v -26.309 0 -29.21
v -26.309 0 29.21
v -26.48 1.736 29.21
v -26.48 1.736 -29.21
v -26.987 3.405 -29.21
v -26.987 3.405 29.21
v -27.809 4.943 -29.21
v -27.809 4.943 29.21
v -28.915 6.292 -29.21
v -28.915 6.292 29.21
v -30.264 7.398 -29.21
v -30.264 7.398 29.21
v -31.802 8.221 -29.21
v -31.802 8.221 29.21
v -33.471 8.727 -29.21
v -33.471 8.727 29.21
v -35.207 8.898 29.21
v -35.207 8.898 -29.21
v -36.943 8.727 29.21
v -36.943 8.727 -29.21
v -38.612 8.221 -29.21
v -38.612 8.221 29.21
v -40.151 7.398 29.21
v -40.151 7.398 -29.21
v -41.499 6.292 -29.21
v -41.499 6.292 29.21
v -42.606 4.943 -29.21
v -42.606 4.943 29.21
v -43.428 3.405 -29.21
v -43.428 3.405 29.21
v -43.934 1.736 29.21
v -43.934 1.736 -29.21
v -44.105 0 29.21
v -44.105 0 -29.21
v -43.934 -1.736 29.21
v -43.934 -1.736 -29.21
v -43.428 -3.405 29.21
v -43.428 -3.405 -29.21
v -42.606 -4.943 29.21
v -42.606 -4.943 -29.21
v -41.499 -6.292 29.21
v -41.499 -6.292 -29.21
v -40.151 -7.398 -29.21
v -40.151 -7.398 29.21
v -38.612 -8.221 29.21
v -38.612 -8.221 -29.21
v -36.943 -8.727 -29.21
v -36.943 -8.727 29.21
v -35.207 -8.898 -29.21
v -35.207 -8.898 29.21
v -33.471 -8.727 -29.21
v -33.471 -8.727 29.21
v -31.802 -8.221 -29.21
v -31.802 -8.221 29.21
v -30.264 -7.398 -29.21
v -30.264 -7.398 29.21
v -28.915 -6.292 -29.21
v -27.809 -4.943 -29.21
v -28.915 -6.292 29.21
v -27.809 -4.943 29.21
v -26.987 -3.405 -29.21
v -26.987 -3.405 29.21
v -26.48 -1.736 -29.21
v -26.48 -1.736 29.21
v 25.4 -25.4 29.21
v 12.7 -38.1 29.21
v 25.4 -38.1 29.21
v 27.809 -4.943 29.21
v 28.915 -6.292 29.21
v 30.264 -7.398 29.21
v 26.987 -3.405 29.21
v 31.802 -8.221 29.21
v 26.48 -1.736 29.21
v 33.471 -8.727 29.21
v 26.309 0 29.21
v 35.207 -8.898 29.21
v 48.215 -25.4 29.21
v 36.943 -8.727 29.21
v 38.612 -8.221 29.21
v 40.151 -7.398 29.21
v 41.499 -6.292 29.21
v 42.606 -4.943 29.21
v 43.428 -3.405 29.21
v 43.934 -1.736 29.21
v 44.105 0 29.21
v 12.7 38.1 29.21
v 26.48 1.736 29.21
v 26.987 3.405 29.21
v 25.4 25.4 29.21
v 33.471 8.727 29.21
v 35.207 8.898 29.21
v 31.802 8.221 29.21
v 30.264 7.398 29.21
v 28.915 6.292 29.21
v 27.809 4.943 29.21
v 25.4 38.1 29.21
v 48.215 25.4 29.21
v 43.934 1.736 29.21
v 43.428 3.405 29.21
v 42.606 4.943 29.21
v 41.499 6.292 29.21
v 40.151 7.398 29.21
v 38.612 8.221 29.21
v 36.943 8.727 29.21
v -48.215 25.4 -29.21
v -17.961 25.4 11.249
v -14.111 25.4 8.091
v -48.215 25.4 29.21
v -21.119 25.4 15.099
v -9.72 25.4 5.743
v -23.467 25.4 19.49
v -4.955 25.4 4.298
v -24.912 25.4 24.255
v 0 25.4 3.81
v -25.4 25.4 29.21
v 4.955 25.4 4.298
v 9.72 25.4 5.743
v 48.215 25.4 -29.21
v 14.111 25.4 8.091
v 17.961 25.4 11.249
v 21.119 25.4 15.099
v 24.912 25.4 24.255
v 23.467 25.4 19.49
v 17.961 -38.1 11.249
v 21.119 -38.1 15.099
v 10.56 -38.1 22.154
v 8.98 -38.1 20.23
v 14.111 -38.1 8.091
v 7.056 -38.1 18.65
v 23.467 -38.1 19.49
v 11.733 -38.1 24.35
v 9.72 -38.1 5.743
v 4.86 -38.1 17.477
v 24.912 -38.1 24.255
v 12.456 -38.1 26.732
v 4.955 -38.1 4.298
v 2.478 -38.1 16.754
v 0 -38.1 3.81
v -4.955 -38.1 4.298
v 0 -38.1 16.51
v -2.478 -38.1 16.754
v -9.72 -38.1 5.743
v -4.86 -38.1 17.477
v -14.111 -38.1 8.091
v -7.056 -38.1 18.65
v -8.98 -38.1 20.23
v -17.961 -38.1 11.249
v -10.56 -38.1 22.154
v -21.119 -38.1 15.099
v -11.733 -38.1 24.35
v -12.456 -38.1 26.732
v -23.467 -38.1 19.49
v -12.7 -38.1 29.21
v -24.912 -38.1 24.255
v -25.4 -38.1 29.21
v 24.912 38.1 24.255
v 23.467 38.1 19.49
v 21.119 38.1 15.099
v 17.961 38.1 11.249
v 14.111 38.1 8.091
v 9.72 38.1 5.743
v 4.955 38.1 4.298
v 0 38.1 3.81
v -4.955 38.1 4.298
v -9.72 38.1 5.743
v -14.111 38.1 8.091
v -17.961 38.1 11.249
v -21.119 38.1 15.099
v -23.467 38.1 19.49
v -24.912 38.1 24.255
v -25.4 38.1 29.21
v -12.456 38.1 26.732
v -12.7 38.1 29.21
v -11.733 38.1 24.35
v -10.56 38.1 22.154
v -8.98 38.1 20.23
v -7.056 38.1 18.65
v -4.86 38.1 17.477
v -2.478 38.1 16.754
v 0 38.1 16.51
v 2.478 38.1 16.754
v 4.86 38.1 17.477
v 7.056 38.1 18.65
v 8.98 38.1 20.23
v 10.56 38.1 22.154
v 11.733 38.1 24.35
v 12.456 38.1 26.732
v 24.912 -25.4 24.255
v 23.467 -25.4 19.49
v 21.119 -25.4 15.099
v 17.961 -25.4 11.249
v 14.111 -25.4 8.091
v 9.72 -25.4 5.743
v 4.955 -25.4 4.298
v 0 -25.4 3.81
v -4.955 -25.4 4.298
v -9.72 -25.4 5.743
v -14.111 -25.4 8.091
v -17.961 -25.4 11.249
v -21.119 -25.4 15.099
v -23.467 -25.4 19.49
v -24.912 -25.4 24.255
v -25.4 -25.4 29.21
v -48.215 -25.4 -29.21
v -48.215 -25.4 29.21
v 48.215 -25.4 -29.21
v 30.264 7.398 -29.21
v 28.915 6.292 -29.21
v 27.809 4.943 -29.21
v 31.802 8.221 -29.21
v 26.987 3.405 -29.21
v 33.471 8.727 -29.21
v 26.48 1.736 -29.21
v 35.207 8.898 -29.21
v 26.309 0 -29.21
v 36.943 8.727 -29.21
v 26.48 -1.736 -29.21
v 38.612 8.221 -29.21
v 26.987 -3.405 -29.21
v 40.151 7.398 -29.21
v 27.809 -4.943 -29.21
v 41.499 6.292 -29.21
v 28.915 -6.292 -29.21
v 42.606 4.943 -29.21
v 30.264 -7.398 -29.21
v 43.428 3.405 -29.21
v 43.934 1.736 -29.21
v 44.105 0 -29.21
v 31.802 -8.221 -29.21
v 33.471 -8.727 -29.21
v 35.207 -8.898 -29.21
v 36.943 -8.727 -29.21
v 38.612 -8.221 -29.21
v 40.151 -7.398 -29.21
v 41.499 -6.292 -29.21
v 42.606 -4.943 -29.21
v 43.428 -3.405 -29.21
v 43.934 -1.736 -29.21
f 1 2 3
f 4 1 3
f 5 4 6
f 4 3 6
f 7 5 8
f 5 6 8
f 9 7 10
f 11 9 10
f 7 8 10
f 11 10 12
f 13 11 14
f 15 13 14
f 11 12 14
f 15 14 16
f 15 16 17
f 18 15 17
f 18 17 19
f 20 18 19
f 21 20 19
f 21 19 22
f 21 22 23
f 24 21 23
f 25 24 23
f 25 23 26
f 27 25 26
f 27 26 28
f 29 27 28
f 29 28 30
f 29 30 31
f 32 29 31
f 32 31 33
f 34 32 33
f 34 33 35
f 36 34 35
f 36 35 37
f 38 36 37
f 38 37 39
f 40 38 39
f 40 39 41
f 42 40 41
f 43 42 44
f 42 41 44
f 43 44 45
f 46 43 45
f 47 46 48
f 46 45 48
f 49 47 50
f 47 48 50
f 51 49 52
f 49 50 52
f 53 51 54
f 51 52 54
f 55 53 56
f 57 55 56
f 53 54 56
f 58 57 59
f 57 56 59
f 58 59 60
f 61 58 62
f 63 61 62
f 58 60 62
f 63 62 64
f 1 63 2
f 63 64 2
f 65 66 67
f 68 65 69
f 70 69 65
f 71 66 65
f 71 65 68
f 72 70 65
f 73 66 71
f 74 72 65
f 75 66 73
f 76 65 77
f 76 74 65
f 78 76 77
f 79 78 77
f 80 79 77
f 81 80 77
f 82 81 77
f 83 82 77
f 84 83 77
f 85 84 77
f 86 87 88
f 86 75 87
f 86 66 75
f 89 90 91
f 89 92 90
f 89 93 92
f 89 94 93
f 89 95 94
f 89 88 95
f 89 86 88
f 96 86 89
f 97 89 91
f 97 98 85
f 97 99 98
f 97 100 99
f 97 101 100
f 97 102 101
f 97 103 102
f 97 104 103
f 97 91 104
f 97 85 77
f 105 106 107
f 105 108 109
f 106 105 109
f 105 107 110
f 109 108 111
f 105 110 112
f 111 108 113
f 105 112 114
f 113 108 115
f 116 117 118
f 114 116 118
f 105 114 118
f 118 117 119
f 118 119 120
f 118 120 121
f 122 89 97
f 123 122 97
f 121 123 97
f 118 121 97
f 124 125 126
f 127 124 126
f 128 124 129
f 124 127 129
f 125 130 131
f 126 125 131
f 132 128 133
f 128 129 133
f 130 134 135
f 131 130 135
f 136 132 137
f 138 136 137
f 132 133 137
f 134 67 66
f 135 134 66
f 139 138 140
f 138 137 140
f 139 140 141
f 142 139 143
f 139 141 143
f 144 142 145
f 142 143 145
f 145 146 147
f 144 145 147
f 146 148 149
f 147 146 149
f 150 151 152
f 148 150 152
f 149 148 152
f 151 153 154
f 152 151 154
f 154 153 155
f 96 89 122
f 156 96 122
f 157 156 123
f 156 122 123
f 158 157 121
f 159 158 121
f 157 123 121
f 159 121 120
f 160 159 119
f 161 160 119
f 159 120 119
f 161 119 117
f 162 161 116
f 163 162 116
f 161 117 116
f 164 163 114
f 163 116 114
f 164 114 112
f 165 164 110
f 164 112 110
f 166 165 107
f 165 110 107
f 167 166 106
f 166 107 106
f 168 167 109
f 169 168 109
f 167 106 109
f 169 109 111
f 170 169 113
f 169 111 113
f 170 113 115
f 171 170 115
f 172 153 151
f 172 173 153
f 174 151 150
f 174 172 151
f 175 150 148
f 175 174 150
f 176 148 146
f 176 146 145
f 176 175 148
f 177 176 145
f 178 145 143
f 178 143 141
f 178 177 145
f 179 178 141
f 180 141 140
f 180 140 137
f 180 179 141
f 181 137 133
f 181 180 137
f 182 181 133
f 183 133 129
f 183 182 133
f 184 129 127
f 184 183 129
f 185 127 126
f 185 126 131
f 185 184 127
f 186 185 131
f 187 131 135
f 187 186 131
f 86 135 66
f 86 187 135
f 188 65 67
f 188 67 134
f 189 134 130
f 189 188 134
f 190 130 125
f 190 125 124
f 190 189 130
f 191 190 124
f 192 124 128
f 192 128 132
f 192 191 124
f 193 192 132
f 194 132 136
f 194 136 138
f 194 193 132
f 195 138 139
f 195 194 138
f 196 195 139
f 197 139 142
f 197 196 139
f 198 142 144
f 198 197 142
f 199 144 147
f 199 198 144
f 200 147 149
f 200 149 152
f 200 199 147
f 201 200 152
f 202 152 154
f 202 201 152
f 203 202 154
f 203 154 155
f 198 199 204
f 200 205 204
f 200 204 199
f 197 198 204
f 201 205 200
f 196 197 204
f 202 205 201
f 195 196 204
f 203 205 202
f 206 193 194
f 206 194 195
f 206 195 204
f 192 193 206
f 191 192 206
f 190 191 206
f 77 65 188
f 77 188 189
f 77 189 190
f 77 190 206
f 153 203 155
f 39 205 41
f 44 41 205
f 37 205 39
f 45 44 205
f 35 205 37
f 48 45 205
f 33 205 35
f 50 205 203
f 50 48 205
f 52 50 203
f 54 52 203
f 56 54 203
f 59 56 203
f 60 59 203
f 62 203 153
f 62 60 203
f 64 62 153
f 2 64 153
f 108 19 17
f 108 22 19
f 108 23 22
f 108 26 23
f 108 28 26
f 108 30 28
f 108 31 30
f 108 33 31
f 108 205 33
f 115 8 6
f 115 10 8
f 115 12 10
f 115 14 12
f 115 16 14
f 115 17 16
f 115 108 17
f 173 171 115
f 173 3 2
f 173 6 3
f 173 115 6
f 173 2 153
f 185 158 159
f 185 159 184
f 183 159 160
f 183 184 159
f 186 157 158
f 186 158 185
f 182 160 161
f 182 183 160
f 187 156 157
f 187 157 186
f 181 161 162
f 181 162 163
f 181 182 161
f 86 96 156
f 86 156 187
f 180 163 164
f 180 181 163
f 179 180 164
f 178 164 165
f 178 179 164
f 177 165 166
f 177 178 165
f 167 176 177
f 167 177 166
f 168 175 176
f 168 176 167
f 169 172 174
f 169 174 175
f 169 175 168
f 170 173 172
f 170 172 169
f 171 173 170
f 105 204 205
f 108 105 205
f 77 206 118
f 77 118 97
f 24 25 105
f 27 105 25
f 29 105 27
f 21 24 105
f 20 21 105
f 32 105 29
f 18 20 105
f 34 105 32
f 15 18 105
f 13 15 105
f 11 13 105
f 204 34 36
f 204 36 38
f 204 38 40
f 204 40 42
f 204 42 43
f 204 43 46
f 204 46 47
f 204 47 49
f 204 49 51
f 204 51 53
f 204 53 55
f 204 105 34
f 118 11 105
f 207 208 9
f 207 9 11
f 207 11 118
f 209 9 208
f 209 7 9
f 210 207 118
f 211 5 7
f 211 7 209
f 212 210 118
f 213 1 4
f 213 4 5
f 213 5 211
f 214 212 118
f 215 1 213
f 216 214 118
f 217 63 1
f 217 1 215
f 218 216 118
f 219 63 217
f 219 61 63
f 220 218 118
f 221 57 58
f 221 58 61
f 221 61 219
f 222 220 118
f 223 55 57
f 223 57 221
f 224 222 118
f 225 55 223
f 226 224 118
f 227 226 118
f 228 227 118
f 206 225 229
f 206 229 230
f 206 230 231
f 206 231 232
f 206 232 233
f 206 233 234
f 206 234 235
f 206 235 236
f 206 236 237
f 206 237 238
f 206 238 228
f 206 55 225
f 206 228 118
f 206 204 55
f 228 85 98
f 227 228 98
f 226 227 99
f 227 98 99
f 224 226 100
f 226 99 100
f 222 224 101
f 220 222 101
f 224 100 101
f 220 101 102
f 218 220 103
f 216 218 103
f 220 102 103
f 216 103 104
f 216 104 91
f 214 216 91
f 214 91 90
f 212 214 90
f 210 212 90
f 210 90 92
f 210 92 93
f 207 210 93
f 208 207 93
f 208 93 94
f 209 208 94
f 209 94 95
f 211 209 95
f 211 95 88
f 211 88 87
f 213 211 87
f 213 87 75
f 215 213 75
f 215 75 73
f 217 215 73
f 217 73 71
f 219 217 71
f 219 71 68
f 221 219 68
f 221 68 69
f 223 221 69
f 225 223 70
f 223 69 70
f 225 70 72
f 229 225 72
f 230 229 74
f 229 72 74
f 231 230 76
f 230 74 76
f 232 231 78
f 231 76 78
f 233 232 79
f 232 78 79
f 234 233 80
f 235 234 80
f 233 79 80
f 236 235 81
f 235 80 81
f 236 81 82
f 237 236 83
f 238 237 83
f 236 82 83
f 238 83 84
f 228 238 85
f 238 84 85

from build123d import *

# Parameters (mm, degrees)
F0_W     = 96.4296718666
F0_H     = 58.42
F1_DEPTH = 25.4
F4_DEPTH = 254
F6_DEPTH = 12.7
F2_R     = 8.8980244031
F7_DEPTH = 254


# Not quite as in the source:
# - a pattern or mirror of a feature is missing from the dataset's text; its kind, count and spacing are read off the source's solid


with BuildPart() as f1:
    # F0 (on Front) → F1 (new body, symmetric)
    with BuildSketch(Plane.XZ):
        Rectangle(F0_W, F0_H)
    extrude(amount=F1_DEPTH, both=True)

    # F3 (on face) → F4 (cut)
    with BuildSketch(Plane.XZ.offset(25.4)):
        with BuildLine():
            Line((12.7, 29.21), (-12.7, 29.21))
            ThreePointArc((-12.7, 29.21), (0, 16.51), (12.7, 29.21))
        make_face()
    extrude(amount=-F4_DEPTH, mode=Mode.SUBTRACT)

    # F5 (on face) → F6 (join)
    with BuildSketch(Plane(origin=(0, 25.4, 0), x_dir=(-1, 0, 0), z_dir=(0, 1, 0))):
        with BuildLine():
            Line((-12.7, 29.21), (-25.4, 29.21))
            ThreePointArc((-25.4, 29.21), (0, 3.81), (25.4, 29.21))
            Line((25.4, 29.21), (12.7, 29.21))
            ThreePointArc((12.7, 29.21), (0, 16.51), (-12.7, 29.21))
        make_face()
    f6 = extrude(amount=F6_DEPTH)

    # F6_copies: F6 across plane
    add(f6.mirror(Plane(origin=(0, 0, 0), x_dir=(0, 0, -1), z_dir=(0, -1, 0))))

    # F2 (on face) → F7 (cut)
    with BuildSketch(Plane.XY.offset(29.21)):
        with Locations((35.2072529495, 0)):
            Circle(F2_R)
        with Locations((-35.2072529495, 0)):
            Circle(F2_R)
    extrude(amount=-F7_DEPTH, mode=Mode.SUBTRACT)


solid = f1.part
